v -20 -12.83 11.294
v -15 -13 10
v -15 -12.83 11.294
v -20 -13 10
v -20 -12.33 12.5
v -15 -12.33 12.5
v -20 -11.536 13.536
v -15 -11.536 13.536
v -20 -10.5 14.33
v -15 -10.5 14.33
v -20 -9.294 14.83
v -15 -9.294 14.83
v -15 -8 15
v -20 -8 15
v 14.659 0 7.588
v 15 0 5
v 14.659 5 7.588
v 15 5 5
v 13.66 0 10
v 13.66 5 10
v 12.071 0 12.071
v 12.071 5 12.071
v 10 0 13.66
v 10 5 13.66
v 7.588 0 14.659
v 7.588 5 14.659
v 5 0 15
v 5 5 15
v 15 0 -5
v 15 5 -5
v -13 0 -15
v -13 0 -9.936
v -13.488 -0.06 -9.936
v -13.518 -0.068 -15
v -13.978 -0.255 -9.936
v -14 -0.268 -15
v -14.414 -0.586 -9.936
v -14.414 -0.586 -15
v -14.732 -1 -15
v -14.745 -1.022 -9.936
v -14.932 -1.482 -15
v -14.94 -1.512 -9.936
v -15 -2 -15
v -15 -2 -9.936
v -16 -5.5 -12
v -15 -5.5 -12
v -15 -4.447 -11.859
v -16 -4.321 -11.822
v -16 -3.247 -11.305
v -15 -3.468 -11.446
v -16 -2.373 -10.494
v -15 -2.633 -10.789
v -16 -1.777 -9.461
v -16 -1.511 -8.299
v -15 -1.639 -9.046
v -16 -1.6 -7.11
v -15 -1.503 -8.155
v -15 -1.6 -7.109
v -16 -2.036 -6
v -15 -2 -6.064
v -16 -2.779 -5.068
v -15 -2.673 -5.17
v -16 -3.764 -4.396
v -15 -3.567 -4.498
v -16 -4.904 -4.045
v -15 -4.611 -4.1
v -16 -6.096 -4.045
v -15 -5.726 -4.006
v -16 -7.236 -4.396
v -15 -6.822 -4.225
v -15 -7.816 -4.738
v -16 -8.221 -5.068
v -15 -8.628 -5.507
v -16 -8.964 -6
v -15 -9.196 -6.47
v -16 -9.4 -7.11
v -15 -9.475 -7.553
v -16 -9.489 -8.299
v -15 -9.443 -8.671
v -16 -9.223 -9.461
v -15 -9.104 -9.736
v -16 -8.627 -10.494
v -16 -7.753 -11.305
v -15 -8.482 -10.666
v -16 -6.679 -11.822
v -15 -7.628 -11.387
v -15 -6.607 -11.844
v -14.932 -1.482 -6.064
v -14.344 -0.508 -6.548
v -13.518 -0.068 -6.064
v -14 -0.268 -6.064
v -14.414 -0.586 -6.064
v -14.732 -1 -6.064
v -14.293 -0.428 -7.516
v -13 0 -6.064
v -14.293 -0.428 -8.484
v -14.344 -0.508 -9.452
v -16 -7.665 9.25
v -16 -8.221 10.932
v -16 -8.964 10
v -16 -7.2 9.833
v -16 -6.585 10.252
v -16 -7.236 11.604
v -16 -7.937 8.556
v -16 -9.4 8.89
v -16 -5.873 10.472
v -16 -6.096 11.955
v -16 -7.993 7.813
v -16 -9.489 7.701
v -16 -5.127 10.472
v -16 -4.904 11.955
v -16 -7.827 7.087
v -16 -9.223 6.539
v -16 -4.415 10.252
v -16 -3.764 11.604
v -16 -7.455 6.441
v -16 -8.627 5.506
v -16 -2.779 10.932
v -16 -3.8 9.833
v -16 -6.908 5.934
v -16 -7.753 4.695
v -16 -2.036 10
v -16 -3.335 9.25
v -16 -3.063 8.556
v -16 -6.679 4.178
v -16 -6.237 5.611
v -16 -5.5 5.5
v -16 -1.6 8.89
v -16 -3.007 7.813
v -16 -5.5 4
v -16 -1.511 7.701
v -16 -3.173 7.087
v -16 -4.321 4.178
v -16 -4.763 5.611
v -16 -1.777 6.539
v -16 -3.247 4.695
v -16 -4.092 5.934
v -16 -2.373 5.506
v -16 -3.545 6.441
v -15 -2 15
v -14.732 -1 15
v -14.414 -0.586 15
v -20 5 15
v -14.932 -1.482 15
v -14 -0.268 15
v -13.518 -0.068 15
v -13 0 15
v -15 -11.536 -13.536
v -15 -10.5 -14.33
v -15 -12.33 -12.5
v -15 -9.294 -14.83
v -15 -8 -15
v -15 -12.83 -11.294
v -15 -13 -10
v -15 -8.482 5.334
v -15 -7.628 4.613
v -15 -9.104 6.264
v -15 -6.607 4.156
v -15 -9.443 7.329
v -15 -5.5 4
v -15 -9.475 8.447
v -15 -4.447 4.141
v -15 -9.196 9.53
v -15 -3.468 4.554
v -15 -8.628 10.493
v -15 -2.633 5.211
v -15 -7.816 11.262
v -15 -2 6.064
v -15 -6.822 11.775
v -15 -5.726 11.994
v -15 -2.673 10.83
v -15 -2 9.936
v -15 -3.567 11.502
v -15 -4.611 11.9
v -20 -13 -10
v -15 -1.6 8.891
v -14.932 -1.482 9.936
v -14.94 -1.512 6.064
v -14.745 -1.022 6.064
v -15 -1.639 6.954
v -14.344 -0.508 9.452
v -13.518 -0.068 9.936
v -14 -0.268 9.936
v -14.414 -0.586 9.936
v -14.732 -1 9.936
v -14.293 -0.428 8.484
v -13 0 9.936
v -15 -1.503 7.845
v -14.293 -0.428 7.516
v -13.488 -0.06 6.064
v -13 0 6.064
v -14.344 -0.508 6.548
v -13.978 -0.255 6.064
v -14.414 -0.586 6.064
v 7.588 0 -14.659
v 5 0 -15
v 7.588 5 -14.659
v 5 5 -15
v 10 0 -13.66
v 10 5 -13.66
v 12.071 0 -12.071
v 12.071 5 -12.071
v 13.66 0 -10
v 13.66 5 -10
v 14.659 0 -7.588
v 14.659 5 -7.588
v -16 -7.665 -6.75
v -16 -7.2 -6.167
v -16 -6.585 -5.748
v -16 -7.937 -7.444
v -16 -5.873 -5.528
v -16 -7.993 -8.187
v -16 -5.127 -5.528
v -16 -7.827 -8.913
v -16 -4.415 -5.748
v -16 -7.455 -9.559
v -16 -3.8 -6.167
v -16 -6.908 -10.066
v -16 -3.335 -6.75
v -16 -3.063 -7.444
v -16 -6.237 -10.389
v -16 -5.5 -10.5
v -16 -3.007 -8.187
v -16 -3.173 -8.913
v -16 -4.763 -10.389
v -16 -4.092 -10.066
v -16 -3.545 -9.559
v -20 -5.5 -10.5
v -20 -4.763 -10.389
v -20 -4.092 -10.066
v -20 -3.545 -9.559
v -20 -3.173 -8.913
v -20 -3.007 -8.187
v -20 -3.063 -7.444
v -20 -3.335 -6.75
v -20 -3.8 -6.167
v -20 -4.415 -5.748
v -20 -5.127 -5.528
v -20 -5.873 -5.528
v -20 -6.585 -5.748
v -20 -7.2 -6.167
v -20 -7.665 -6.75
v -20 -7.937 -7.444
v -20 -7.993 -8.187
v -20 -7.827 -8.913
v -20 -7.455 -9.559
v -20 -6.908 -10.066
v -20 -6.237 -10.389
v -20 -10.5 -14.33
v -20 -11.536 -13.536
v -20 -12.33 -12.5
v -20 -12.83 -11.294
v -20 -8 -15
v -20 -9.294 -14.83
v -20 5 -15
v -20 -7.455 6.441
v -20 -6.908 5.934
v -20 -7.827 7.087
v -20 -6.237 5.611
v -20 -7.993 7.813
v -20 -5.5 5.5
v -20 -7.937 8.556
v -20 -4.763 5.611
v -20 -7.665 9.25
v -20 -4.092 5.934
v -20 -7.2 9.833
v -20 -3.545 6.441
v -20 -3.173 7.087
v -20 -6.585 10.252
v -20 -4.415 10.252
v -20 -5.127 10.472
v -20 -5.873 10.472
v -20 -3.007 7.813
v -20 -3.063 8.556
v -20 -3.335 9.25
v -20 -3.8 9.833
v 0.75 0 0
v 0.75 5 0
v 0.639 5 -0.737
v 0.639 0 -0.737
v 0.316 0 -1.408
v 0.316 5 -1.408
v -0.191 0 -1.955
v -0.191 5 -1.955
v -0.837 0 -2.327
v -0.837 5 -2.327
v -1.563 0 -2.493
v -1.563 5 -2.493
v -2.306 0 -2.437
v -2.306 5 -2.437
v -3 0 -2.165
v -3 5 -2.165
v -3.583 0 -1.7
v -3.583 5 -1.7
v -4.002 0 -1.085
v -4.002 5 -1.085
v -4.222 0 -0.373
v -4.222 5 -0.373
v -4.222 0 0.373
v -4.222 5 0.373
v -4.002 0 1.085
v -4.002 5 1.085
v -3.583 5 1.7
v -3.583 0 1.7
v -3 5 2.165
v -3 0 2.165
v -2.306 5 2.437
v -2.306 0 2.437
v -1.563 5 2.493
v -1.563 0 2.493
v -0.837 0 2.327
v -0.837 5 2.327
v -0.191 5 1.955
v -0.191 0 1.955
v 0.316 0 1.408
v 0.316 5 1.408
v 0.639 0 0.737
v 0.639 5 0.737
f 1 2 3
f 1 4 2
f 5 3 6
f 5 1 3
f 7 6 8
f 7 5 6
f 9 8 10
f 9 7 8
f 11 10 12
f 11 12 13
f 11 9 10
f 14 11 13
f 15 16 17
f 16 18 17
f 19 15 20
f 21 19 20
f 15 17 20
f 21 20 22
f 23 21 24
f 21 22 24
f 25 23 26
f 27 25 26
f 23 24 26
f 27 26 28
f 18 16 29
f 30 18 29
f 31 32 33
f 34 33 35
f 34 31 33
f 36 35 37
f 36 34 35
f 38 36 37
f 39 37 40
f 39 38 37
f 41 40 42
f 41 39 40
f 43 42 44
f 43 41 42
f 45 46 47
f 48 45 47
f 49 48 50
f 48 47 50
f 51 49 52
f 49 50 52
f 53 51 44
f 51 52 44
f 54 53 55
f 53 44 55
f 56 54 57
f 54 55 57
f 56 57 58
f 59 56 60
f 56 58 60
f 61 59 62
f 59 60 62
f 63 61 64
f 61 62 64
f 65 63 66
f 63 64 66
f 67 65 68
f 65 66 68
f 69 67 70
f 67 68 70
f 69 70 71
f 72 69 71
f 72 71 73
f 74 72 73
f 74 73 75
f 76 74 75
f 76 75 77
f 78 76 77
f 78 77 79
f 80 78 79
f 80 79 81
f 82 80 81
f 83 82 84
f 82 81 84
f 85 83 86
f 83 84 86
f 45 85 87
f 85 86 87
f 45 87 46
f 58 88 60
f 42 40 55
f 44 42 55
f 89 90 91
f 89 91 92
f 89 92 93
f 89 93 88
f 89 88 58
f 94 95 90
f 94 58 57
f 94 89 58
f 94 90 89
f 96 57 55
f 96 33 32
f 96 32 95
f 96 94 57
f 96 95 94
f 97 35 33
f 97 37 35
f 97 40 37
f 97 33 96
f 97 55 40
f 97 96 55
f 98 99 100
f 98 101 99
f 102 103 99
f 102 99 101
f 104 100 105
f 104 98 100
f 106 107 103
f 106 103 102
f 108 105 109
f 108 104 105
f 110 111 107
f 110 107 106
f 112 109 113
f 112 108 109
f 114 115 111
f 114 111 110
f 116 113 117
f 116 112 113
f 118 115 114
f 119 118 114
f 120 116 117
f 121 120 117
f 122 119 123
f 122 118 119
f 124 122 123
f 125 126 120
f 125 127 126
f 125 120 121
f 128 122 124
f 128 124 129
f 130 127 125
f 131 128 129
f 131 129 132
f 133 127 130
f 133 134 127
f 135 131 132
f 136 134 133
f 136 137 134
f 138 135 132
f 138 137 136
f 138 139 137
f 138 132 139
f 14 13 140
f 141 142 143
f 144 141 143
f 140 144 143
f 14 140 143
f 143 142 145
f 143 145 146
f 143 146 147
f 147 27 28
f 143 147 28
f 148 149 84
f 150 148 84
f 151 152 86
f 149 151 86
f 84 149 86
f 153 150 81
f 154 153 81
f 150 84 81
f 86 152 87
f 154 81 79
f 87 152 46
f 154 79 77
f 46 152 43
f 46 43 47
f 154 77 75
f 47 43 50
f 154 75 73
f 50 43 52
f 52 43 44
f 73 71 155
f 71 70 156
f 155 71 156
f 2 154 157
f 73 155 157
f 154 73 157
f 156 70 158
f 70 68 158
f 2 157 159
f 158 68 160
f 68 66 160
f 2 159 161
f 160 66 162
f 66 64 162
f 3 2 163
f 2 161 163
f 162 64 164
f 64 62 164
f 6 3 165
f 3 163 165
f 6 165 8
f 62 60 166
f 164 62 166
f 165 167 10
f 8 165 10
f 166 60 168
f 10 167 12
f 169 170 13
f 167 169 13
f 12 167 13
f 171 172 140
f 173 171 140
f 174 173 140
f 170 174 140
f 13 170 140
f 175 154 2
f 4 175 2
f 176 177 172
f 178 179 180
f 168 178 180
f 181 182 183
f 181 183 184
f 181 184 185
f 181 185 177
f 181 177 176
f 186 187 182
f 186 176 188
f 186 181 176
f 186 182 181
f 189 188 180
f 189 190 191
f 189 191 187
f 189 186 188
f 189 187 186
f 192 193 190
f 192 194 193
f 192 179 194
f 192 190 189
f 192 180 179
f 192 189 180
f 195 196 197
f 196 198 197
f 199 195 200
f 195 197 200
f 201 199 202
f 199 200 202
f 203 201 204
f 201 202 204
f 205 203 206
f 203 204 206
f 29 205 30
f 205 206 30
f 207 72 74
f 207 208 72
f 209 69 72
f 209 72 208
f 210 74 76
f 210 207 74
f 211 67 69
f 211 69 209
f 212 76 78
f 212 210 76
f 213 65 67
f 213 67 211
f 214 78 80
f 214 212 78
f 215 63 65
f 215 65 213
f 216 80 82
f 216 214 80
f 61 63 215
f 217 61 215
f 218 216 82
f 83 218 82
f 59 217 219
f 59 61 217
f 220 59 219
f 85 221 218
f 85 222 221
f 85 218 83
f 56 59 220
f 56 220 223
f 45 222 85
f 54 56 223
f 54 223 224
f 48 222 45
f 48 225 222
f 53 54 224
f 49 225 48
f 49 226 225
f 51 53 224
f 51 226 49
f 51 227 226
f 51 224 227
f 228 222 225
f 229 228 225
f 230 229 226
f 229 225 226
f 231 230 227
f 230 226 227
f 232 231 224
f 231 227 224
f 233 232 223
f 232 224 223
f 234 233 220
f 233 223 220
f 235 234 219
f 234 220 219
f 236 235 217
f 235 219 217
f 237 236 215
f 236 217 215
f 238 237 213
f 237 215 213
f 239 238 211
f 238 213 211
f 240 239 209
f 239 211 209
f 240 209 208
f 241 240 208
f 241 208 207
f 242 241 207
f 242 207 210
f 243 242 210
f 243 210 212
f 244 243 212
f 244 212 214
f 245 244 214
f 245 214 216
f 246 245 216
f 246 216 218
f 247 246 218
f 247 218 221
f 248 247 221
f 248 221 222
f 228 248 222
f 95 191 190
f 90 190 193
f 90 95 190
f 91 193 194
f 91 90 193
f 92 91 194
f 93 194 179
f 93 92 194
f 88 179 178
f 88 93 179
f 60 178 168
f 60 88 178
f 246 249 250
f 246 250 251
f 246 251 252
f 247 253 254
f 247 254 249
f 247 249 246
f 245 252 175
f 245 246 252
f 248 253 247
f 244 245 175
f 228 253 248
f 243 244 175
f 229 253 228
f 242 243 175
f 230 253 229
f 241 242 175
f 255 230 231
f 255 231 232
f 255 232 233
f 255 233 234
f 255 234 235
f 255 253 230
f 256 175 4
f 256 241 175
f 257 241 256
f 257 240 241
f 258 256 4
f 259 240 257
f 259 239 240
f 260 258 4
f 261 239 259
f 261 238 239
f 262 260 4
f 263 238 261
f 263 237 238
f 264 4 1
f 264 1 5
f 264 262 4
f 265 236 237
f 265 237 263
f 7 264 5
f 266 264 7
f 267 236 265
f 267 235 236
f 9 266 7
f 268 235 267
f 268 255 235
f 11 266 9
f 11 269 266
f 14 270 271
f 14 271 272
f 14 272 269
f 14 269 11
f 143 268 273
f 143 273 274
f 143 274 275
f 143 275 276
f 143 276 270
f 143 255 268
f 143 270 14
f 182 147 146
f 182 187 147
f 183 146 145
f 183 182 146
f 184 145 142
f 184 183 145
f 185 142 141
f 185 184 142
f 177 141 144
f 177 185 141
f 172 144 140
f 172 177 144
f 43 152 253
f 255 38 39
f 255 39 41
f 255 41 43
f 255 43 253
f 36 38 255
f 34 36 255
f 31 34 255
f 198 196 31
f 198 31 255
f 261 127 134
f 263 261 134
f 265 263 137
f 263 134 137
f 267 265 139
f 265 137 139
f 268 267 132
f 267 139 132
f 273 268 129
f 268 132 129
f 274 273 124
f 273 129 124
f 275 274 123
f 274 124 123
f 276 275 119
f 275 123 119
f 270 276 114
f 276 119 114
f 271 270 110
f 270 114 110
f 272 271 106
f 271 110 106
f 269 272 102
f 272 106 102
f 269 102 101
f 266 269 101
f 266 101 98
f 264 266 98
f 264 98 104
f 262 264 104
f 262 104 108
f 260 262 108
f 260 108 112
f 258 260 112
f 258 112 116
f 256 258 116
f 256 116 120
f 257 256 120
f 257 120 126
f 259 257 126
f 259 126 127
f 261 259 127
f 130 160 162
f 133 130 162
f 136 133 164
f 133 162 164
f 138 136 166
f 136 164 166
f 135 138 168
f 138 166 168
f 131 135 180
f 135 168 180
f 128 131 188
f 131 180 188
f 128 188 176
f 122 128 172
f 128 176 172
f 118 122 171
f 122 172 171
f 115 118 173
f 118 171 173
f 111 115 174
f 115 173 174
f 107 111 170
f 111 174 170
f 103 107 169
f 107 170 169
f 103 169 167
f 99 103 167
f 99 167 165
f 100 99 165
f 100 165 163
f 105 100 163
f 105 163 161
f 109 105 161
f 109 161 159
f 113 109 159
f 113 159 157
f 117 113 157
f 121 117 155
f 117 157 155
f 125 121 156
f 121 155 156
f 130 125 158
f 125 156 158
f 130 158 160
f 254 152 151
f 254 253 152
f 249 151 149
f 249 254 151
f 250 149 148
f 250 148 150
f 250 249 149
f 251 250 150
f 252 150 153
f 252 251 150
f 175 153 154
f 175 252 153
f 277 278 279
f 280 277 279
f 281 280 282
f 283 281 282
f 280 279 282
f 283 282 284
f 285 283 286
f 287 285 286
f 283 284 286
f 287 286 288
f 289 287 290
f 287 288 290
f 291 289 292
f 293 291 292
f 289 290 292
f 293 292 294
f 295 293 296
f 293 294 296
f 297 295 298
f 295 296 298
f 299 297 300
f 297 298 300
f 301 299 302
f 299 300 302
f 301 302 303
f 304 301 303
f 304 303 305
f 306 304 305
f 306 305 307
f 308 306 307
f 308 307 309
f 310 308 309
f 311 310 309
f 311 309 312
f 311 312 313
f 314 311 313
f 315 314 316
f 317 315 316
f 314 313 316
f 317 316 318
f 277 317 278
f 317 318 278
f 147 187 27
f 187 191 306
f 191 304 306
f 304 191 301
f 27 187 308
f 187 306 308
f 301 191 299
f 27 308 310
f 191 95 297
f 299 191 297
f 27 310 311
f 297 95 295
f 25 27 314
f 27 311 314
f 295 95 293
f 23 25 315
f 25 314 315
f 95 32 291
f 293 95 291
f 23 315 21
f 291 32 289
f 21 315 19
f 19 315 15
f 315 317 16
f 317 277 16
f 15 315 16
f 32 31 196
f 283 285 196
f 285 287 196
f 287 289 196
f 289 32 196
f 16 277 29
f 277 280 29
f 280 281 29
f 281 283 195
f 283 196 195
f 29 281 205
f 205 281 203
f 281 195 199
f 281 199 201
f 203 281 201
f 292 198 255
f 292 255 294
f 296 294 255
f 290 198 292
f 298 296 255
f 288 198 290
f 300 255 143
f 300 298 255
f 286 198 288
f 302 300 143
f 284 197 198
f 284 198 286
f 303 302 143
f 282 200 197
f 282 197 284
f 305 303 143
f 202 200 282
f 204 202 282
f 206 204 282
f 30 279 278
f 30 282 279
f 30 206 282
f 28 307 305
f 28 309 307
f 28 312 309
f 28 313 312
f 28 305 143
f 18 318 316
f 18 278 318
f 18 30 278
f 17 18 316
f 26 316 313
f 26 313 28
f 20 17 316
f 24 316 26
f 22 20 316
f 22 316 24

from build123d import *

# Parameters (mm, degrees)
SKETCH1_W           = 30
SKETCH1_H           = 30
BOSS_EXTRUDE1_DEPTH = 5
SKETCH2_W           = 30
SKETCH2_H           = 18
BOSS_EXTRUDE2_DEPTH = 5
SKETCH3_R           = 4
CUT_EXTRUDE1_DEPTH  = 1
SKETCH4_R           = 2.5
CUT_EXTRUDE2_DEPTH  = 5
SKETCH5_R           = 2.5
CUT_EXTRUDE3_DEPTH  = 5
FILLET1_R           = 10
FILLET2_R           = 2
FILLET3_R           = 5


with BuildPart() as part:
    # Sketch1 → Boss-Extrude1 (new body)
    with BuildSketch(Plane(origin=(0, 0, 0), x_dir=(1, 0, 0), z_dir=(0, 1, 0))):
        Rectangle(SKETCH1_W, SKETCH1_H)
    extrude(amount=BOSS_EXTRUDE1_DEPTH)

    # Sketch2 → Boss-Extrude2 (add)
    with BuildSketch(Plane.ZY.offset(15)):
        with Locations((0, -4)):
            Rectangle(SKETCH2_W, SKETCH2_H)
    extrude(amount=BOSS_EXTRUDE2_DEPTH)

    # Sketch3 → Cut-Extrude1 (cut)
    with BuildSketch(Plane(origin=(-15, 0, 0), x_dir=(0, 0, -1), z_dir=(1, 0, 0))):
        with Locations((-8, -5.5)):
            Circle(SKETCH3_R)
        with Locations((8, -5.5)):
            Circle(SKETCH3_R)
    extrude(amount=-CUT_EXTRUDE1_DEPTH, mode=Mode.SUBTRACT)

    # Sketch4 → Cut-Extrude2 (cut)
    with BuildSketch(Plane(origin=(-16, 0, 0), x_dir=(0, 0, -1), z_dir=(1, 0, 0))):
        with Locations((-8, -5.5)):
            Circle(SKETCH4_R)
        with Locations((8, -5.5)):
            Circle(SKETCH4_R)
    extrude(amount=-CUT_EXTRUDE2_DEPTH, mode=Mode.SUBTRACT)

    # Sketch5 → Cut-Extrude3 (cut)
    with BuildSketch(Plane(origin=(0, 5, 0), x_dir=(1, 0, 0), z_dir=(0, 1, 0))):
        with Locations((-1.75, 0)):
            Circle(SKETCH5_R)
    extrude(amount=-CUT_EXTRUDE3_DEPTH, mode=Mode.SUBTRACT)

    # Fillet1
    fillet1_edges = [part.edges().sort_by_distance(p)[0] for p in [
        (15, 2.5, -15),
        (15, 2.5, 15),
    ]]
    fillet(fillet1_edges, radius=FILLET1_R)

    # Fillet2
    fillet2_edges = [part.edges().sort_by_distance(p)[0] for p in [
        (-15, 0, 0),
    ]]
    fillet(fillet2_edges, radius=FILLET2_R)

    # Fillet3
    fillet3_edges = [part.edges().sort_by_distance(p)[0] for p in [
        (-17.5, -13, -15),
        (-17.5, -13, 15),
    ]]
    fillet(fillet3_edges, radius=FILLET3_R)


solid = part.part
